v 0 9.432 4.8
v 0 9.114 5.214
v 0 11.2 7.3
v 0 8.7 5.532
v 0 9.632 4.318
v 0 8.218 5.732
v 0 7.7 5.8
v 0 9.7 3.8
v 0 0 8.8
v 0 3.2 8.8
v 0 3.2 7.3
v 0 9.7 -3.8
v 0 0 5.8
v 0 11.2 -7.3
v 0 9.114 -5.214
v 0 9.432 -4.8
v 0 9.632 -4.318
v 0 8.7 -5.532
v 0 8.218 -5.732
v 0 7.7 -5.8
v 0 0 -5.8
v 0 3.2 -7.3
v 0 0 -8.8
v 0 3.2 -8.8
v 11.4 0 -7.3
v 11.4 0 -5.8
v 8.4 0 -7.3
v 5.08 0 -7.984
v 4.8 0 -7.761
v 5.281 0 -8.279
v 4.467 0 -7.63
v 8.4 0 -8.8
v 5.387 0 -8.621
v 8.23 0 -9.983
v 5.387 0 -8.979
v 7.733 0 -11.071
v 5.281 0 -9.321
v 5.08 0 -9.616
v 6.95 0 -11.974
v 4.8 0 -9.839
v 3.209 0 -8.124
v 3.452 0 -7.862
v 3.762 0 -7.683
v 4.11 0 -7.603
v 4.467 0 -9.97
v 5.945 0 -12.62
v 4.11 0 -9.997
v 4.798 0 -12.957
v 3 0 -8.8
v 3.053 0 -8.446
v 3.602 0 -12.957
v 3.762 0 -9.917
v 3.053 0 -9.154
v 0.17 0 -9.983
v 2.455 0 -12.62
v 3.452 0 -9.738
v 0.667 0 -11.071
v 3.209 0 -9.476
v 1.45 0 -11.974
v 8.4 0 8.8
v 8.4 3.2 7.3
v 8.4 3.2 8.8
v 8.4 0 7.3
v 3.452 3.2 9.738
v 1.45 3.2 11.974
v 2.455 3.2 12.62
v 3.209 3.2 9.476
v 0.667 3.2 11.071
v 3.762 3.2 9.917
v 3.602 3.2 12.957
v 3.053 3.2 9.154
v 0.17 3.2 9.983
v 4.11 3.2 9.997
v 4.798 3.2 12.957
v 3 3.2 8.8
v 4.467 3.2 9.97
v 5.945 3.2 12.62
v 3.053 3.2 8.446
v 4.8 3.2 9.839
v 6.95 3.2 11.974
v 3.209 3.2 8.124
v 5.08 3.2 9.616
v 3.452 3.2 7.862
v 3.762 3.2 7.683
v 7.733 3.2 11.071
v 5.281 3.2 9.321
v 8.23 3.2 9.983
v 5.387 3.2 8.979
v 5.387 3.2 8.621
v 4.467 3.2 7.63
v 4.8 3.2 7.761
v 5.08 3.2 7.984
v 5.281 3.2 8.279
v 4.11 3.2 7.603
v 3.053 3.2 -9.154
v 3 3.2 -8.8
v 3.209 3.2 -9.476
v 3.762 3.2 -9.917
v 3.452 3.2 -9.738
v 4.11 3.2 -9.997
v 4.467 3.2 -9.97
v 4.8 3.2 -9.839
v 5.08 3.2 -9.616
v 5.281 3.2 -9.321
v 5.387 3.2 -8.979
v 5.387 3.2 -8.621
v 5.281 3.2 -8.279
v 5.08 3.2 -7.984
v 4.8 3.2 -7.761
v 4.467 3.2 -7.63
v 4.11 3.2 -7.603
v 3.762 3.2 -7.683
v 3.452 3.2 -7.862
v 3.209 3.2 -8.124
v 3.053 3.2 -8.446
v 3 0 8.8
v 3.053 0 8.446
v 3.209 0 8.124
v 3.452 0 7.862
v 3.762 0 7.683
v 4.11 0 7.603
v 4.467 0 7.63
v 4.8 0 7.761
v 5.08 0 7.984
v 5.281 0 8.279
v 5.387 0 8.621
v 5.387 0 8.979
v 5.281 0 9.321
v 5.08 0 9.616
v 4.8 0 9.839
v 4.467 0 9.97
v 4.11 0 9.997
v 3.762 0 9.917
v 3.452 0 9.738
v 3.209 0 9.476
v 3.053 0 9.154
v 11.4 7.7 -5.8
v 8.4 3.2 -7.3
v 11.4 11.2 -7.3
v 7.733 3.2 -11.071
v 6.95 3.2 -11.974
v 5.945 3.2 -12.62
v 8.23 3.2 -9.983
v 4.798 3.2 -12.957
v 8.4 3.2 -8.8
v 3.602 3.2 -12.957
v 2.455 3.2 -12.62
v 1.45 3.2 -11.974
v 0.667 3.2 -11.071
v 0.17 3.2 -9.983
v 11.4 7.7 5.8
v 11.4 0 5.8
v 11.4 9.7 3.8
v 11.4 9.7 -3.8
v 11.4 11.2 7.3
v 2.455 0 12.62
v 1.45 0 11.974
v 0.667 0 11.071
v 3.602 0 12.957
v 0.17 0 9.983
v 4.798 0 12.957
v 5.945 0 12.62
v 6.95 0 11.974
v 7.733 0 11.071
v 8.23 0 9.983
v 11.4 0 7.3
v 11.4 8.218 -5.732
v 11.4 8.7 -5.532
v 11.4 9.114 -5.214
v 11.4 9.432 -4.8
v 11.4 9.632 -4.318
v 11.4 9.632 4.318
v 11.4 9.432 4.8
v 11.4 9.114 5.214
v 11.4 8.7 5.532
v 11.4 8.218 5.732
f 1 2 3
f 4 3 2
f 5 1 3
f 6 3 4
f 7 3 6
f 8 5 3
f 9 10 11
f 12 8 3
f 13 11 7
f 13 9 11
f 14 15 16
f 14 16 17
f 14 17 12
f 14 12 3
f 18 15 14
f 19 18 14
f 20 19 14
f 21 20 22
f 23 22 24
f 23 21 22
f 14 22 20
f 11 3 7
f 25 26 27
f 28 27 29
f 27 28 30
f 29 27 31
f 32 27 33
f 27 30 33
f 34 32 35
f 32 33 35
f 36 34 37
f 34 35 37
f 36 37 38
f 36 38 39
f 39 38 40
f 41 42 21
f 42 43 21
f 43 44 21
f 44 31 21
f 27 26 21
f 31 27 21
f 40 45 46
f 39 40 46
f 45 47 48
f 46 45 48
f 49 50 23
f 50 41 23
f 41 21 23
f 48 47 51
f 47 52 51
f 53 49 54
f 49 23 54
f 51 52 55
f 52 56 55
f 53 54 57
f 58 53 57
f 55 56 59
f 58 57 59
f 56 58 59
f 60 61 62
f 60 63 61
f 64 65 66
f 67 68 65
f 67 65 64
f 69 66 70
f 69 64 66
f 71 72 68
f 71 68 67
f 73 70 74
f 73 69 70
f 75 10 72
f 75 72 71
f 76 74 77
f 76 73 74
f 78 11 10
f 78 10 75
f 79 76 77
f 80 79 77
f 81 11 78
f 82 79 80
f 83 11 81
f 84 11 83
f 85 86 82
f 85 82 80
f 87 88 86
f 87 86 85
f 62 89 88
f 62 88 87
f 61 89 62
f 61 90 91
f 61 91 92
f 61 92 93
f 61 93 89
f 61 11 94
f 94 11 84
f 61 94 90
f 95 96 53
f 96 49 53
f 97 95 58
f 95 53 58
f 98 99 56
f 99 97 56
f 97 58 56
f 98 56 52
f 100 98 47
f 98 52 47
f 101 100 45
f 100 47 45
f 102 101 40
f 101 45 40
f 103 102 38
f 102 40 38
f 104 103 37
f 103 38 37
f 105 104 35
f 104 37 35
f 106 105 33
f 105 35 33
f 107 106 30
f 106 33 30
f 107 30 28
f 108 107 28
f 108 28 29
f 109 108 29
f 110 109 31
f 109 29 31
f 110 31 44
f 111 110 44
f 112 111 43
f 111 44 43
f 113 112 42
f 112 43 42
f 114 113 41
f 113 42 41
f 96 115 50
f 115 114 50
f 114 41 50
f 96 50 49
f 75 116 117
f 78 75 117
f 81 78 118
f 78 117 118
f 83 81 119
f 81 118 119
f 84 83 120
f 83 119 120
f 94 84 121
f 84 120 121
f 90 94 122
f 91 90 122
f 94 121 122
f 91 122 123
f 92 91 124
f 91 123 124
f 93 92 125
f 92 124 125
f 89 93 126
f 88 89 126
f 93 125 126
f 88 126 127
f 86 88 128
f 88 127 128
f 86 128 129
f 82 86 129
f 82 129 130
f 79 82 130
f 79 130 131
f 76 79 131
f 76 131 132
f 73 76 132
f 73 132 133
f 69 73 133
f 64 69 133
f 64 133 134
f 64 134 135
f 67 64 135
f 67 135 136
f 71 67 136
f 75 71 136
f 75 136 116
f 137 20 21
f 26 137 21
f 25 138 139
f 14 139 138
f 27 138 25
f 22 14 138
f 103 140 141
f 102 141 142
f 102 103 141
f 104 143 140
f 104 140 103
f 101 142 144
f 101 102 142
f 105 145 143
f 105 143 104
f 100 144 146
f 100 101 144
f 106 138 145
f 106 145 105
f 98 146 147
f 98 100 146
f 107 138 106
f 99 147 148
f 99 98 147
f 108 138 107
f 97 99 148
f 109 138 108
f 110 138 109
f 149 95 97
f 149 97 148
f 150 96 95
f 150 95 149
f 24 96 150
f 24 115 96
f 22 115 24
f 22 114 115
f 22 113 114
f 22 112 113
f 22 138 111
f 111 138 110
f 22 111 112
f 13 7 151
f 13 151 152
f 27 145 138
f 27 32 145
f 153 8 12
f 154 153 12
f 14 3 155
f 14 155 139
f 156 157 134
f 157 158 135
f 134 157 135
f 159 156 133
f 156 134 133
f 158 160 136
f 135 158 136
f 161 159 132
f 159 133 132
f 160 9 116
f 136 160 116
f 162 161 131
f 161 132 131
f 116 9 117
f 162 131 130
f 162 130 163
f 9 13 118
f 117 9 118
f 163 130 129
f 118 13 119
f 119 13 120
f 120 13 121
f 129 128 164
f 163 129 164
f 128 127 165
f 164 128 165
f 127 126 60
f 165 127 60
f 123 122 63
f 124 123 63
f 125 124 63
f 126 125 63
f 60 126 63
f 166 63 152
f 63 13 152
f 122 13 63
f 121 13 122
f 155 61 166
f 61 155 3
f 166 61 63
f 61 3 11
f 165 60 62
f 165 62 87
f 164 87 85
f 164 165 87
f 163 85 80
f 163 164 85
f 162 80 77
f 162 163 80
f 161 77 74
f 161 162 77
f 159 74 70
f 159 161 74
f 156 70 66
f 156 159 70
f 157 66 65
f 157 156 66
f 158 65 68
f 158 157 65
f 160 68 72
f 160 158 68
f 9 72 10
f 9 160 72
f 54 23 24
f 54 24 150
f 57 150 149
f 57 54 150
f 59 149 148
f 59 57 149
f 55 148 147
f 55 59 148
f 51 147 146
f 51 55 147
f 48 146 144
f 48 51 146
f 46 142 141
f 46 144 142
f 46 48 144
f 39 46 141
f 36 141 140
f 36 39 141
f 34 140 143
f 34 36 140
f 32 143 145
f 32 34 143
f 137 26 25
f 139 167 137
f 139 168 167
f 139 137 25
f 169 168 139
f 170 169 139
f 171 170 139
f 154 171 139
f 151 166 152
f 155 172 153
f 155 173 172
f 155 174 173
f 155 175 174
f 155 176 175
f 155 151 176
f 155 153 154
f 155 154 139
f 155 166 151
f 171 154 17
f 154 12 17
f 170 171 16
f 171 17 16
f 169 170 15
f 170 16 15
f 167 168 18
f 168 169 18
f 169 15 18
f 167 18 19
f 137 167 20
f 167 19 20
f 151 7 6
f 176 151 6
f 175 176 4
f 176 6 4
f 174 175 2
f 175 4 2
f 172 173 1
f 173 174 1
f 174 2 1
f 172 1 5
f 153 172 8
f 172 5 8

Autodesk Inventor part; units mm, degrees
ref_plane "YZ Plane" through (0, 0, 0) normal (1, 0, 0) x (0, 1, 0)
ref_plane "XZ Plane" through (0, 0, 0) normal (0, 1, 0) x (-1, 0, 0)
ref_plane "XY Plane" through (0, 0, 0) normal (0, 0, 1) x (1, 0, 0)
sketch "Sketch1" plane through (0, 0, 0) normal (1, 0, 0) x (0, 1, 0)
  line L0 (11.2, 0) -> (11.2, -7.3)
  line L1 (11.2, -7.3) -> (0, -7.3)
  line L2 (9.7, 0) -> (9.7, -3.8)
  line L3 (7.7, -5.8) -> (0, -5.8)
  arc A0 (7.7, -5.8) -> (9.7, -3.8) centre (7.7, -3.8) ccw
  line L4 (0, -5.8) -> (0, -7.3)
  line L5 (0, 0) -> (11.2, 0) construction
  line L6 (11.2, 0) -> (11.2, 7.3)
  line L7 (11.2, 7.3) -> (0, 7.3)
  line L8 (9.7, 0) -> (9.7, 3.8)
  line L9 (7.7, 5.8) -> (0, 5.8)
  arc A1 (9.7, 3.8) -> (7.7, 5.8) centre (7.7, 3.8) ccw
  line L10 (0, 5.8) -> (0, 7.3)
  dimension "d2" = 5.8
  dimension "d4" = 1.5
  dimension "d5" = 2
  dimension "d6" = 11.2
  dimension "d7" = 1.5
extrude "Extrusion1" add sketch "Sketch1" along normal blind 11.4
sketch "Sketch3" plane through (0, 0, 0) normal (0, 1, 0) x (-1, 0, 0)
  line L0 (0, -7.3) -> (0, 7.3) projected
  line L1 (0, -7.3) -> (0, -8.8)
  line L2 (-8.4, -8.8) -> (-8.4, -7.3)
  line L3 (0, -7.3) -> (-11.4, -7.3) projected
  line L4 (0, -8.8) -> (-8.4, -8.8) construction
  arc A0 (-8.4, -8.8) -> (0, -8.8) centre (-4.2, -8.8) ccw
  circle A1 centre (-4.2, -8.8) radius 1.2
  point P0 (0, 0)
  dimension "d12" = 1.5
  dimension "d13" = 4.2
  dimension "d16" = 2.4
extrude "Extrusion2" add sketch "Sketch3" along normal blind 3.2
mirror "Mirror1" about plane through (0, 0, 0) normal (0, 0, 1) of "Extrusion2"
properties part number "soporteMotor"
